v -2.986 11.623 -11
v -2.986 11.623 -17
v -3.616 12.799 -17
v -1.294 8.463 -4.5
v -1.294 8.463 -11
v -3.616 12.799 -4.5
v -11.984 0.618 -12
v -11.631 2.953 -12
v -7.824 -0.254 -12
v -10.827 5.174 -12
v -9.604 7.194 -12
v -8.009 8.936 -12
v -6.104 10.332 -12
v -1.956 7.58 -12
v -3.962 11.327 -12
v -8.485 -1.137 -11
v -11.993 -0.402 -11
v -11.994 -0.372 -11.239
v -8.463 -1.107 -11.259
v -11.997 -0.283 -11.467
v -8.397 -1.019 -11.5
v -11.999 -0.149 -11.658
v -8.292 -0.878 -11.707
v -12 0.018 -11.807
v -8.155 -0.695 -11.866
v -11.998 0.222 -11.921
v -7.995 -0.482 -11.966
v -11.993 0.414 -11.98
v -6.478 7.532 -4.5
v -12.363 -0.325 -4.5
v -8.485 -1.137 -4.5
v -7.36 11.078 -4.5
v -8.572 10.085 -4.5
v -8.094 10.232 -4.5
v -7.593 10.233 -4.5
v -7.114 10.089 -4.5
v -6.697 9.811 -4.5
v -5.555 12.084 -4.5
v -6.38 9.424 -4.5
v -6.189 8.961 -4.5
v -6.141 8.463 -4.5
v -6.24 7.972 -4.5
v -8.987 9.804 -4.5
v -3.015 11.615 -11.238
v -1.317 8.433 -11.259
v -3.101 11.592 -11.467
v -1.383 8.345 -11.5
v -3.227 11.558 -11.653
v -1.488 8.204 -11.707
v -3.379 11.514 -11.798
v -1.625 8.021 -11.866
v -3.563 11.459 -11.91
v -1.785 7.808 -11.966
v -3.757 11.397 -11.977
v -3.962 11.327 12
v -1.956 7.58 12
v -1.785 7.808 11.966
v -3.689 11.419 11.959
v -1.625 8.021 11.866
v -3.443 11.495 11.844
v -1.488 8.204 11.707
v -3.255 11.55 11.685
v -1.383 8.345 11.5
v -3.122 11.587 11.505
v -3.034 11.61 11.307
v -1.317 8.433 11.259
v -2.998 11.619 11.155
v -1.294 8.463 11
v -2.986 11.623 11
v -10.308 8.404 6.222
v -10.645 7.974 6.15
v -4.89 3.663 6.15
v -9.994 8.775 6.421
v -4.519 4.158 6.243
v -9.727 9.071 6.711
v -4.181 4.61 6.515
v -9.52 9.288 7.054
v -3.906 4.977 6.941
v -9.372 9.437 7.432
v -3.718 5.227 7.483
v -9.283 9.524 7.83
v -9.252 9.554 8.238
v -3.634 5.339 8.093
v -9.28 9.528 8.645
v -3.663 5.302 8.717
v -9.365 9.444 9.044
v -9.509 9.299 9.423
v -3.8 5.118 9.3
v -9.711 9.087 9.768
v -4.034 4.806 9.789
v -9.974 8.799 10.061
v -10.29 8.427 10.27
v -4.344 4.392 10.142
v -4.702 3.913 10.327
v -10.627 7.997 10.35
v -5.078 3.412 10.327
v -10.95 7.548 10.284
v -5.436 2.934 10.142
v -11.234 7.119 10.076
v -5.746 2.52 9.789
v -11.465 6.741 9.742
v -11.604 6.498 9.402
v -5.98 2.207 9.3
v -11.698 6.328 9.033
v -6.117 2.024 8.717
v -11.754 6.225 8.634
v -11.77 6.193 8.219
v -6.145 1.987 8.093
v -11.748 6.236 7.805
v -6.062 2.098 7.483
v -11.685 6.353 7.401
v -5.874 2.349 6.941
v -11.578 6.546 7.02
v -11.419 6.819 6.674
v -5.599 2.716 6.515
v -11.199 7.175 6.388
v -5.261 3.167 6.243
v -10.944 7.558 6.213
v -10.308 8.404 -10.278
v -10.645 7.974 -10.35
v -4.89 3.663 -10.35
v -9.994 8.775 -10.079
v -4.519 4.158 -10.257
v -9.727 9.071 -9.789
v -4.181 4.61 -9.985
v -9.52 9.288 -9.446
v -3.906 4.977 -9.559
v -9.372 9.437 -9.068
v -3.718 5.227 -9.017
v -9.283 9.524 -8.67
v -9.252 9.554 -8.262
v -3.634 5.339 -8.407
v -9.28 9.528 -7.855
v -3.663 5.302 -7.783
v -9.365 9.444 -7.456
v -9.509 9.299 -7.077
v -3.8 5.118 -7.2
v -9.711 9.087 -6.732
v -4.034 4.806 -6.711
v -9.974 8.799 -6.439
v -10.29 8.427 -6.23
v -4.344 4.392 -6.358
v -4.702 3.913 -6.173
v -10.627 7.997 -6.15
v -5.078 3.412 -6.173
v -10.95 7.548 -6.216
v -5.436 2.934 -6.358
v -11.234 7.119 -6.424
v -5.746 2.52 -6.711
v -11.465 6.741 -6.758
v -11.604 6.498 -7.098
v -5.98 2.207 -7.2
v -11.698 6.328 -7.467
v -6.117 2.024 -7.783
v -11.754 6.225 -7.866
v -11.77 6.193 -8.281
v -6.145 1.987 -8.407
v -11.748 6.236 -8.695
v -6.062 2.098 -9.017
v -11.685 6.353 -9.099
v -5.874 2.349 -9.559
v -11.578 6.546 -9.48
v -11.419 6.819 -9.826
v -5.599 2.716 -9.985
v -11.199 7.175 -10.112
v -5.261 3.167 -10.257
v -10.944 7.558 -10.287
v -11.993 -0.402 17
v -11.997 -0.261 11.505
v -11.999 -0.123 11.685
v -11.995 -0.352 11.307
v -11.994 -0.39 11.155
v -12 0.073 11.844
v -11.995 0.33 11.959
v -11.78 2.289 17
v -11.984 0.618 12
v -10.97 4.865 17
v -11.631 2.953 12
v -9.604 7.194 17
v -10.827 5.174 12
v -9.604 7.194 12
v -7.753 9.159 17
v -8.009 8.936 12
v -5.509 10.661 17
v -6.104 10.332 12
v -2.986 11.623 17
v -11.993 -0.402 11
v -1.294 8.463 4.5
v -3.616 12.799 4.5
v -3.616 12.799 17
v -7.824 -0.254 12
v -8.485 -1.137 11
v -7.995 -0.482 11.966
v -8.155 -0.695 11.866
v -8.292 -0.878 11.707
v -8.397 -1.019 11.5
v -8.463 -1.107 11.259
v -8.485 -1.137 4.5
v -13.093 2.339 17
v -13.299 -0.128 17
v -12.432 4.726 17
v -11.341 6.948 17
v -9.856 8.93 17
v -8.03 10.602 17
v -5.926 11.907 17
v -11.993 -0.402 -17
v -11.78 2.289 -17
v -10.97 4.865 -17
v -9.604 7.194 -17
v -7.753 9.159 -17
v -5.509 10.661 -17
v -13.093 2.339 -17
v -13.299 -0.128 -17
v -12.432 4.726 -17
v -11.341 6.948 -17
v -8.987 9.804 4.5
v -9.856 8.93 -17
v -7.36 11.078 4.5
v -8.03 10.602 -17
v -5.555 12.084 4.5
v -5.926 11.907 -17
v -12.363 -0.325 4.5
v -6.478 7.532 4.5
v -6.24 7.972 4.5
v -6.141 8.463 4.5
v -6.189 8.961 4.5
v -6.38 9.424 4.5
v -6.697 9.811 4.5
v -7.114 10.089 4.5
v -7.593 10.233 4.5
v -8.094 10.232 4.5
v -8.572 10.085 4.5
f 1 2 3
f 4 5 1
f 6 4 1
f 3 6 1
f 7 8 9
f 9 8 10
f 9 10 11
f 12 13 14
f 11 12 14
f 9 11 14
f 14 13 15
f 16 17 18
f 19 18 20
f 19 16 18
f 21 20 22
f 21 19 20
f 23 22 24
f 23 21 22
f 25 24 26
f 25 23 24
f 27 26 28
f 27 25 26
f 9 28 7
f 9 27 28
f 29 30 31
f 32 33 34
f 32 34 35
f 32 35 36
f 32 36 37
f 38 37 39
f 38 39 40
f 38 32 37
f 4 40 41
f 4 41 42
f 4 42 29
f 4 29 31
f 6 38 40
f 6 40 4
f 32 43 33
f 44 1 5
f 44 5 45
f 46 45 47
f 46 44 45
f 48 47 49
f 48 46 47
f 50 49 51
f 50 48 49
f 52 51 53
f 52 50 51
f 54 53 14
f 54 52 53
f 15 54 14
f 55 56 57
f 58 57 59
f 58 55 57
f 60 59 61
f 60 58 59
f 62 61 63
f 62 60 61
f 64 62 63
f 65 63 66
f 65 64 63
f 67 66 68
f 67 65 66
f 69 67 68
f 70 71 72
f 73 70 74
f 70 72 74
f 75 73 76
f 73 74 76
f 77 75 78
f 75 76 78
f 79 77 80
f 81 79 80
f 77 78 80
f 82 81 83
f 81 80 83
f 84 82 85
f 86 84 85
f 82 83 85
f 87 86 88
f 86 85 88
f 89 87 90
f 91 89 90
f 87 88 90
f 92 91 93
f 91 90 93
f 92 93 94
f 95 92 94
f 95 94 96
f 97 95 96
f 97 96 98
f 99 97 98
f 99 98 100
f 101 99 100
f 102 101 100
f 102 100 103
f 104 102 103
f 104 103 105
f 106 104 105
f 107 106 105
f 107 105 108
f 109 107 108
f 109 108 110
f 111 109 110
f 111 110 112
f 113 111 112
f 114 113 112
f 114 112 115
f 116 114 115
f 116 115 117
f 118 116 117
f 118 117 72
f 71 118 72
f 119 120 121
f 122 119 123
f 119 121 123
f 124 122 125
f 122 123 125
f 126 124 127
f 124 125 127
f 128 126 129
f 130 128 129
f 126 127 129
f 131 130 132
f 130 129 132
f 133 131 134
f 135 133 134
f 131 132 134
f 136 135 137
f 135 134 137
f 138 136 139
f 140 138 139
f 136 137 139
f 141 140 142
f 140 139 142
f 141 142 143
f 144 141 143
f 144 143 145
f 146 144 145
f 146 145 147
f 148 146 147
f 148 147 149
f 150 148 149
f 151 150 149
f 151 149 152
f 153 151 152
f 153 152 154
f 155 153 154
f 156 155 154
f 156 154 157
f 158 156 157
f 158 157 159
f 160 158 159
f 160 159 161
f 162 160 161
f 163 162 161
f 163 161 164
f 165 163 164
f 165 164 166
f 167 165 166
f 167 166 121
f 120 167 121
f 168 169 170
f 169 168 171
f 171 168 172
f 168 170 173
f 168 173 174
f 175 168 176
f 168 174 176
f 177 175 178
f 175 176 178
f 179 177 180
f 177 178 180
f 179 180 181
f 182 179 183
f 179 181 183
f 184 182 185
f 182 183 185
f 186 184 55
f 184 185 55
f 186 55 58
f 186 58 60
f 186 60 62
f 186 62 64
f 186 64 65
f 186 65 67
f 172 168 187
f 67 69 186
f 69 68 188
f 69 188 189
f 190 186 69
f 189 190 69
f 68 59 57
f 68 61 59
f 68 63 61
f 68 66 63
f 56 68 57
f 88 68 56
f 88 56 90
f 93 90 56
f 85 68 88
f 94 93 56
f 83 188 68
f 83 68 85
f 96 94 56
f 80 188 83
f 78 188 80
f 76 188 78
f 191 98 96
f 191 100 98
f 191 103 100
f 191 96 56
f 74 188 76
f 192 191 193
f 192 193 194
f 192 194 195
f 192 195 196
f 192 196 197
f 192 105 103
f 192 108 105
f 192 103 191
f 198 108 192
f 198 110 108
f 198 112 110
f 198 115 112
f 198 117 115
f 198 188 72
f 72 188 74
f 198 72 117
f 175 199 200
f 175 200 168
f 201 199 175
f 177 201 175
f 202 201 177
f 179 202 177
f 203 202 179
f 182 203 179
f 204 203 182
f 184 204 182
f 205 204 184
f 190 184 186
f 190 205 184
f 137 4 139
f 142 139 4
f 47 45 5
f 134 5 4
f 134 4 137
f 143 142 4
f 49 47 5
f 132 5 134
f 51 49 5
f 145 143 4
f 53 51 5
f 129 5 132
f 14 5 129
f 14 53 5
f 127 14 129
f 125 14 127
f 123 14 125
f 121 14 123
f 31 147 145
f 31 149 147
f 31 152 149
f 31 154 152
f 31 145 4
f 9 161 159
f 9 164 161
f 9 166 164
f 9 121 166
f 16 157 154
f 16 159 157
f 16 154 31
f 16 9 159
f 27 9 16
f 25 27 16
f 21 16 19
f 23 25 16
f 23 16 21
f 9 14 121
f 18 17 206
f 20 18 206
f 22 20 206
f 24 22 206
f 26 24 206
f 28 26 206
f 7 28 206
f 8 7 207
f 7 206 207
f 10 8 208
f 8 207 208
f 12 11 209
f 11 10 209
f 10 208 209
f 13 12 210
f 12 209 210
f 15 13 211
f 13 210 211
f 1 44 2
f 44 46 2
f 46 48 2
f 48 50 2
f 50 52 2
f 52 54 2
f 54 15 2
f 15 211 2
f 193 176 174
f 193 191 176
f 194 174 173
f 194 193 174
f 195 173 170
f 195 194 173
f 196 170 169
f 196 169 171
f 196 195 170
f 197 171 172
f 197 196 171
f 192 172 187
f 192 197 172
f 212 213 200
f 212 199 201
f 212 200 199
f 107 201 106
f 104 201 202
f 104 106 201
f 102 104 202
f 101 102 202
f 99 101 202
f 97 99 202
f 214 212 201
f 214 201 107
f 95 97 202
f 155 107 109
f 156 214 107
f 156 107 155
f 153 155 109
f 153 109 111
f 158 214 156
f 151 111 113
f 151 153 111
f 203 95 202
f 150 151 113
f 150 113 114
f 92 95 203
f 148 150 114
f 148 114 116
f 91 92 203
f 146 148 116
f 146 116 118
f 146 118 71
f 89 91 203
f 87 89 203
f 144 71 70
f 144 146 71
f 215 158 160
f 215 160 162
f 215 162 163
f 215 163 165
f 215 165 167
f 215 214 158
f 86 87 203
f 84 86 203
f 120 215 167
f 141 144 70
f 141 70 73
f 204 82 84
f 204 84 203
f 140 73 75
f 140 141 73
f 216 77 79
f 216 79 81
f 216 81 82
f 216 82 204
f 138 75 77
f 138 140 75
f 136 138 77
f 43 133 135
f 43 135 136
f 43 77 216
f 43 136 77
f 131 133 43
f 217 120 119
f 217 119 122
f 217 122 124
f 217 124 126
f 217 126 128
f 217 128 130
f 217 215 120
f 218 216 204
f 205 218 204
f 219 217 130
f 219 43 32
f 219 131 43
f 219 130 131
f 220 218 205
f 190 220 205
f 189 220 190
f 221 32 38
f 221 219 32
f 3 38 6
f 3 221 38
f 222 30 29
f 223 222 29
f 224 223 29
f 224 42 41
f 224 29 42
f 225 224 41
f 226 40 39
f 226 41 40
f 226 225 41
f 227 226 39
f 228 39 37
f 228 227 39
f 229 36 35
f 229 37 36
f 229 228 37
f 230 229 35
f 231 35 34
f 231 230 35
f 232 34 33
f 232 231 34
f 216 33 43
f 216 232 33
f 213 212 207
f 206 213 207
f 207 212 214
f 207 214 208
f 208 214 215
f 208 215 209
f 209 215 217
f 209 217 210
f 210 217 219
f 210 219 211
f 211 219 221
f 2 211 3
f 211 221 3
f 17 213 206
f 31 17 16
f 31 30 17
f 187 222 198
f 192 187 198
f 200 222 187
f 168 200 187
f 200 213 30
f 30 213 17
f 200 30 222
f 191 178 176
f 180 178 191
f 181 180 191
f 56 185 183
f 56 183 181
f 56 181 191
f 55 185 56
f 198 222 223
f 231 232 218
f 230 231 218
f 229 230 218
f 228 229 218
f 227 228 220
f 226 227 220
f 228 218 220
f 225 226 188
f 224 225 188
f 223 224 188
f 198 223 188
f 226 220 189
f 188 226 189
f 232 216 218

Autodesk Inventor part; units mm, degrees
ref_plane "YZ Plane" through (0, 0, 0) normal (1, 0, 0) x (0, 1, 0)
ref_plane "XZ Plane" through (0, 0, 0) normal (0, 1, 0) x (-1, 0, 0)
ref_plane "XY Plane" through (0, 0, 0) normal (0, 0, 1) x (1, 0, 0)
sketch "Эскиз1" plane through (0, 0, 0) normal (0, 0, 1) x (1, 0, 0)
  arc A0 (-0.8919, 11.7662) -> (-11.5424, -2.4521) centre (0, 0) ccw projected
  line L0 (-0.016, 10.1696) -> (-9.7639, -2.8438) projected
  line L1 (-9.7639, -2.8438) -> (-12.4663, -6.4515) projected
  arc A1 (-0.8919, 11.7662) -> (-11.5424, -2.4521) centre (0, 0) ccw projected
  line L2 (2.8533, 14) -> (-0.016, 10.1696) projected
  arc A2 (-8.5159, 10.4752) -> (-12.3517, -5.4484) centre (0, 0) ccw projected
  circle A3 centre (0, 0) radius 13.5
  circle A4 centre (0, 0) radius 11.8
  circle A5 centre (0, 0) radius 13.3
  circle A6 centre (0, 0) radius 12
  line L3 (-8.1467, 14) -> (2.8533, 14) projected
  line L4 (-8.1467, 14) -> (-8.1467, 11.2511) projected
  arc A7 (-11.5424, -2.4521) -> (-9.7639, -2.8438) centre (-10.5642, -2.2443) ccw projected
  arc A8 (-0.016, 10.1696) -> (-0.8919, 11.7662) centre (-0.8163, 10.7691) ccw projected
  arc A9 (-8.5159, 10.4752) -> (-8.1467, 11.2511) centre (-9.1467, 11.2511) ccw projected
  arc A10 (-12.4663, -6.4515) -> (-12.3517, -5.4484) centre (-13.2667, -5.852) ccw projected
  arc A11 (-11.5424, -2.4521) -> (-9.7639, -2.8438) centre (-10.5642, -2.2443) ccw projected
  arc A12 (-0.016, 10.1696) -> (-0.8919, 11.7662) centre (-0.8163, 10.7691) ccw projected
  point P0 (1.1623, 11.7426)
  point P1 (2.3273, 13.2979)
  point P2 (-11.0819, -4.6034)
  point P3 (1.302, 11.9292)
  point P4 (2.1926, 13.118)
  point P5 (-11.9725, -5.7923)
  dimension "d1" = 0.2
  dimension "d2" = 0.2
extrude "Выдавливание1" add sketch "Эскиз1" along normal mid plane 34 contours A6 L1 A5 L2 picked at (-9.9488, 8.0267)
sketch "Эскиз2" plane through (0, 0, 0) normal (0, 0, 1) x (1, 0, 0)
  arc A0 (-0.8919, 11.7662) -> (-11.5424, -2.4521) centre (0, 0) ccw projected
  line L0 (-0.016, 10.1696) -> (-9.7639, -2.8438) projected
  arc A1 (1.302, 11.9292) -> (-11.0819, -4.6034) centre (0, 0) ccw projected
  line L1 (-14.5944, -9.2926) -> (2.8533, 14) projected
  arc A2 (-11.5424, -2.4521) -> (-9.7639, -2.8438) centre (-10.5642, -2.2443) ccw projected
  arc A3 (-0.016, 10.1696) -> (-0.8919, 11.7662) centre (-0.8163, 10.7691) ccw projected
  point P0 (1.1623, 11.7426)
  point P1 (-10.9422, -4.4168)
extrude "Выдавливание2" add sketch "Эскиз2" along normal mid plane 24
sketch "Эскиз3" plane through (0, 0, 0) normal (0, 0, 1) x (1, 0, 0)
  arc A0 (1.302, 11.9292) -> (-11.0819, -4.6034) centre (0, 0) ccw projected
  line L0 (-11.0819, -4.6034) -> (1.302, 11.9292) projected
  arc A1 (2.1926, 13.118) -> (-11.9725, -5.7923) centre (0, 0) ccw projected
  arc A2 (-8.5159, 10.4752) -> (-12.3517, -5.4484) centre (0, 0) ccw projected
  line L1 (1.302, 11.9292) -> (-11.0819, -4.6034) projected
  line L2 (-4.8899, 3.6629) -> (-10.8048, 8.0935)
  line L3 (-10.8048, 8.0935) -> (-7.6034, 5.6955)
  line L4 (-12.0998, -0.3072) -> (-3.107, 11.6981)
  line L5 (-3.107, 11.6981) -> (0.0944, 9.3001)
  line L6 (0.0944, 9.3001) -> (-8.8984, -2.7053)
  line L7 (-8.8984, -2.7053) -> (-12.0998, -0.3072)
  line L8 (-12.3798, -0.3474) -> (-3.1472, 11.9781)
  line L9 (-3.1472, 11.9781) -> (0.3744, 9.3402)
  line L10 (0.3744, 9.3402) -> (-8.8582, -2.9853)
  line L11 (-8.8582, -2.9853) -> (-12.3798, -0.3474)
  point P0 (-4.402, 3.2974)
  dimension "d7" = 4
  dimension "d8" = 15
  dimension "d9" = 4
  dimension "d12" = 0.2
  dimension "d13" = 15.4
extrude "Выдавливание3" cut sketch "Эскиз3" along normal mid plane 9 contours L9 L0 L5 A0 | A0 L5 L4 L8 L9 | L9 L10 L11 L0 L7 L6 L5 | L5 L0 L2 L4 A0 | A0 L4 L5 | L5 L6 L7 L0 | L4 L2 L8 A0 | L0 L7 A0 L4 L2 | L4 A0 L8 L2 | L0 L11 A0 L7 | L4 L7 A0 L11 L8 | A0 L7 L4
sketch "Эскиз5" plane through (0, 0, 17) normal (0, 0, 1) x (1, 0, 0)
  arc A0 (2.1926, 13.118) -> (-11.9725, -5.7923) centre (0, 0) ccw projected
  circle A1 centre (0, 0) radius 13.3
  line L0 (2.8533, 17.048) -> (2.8533, 14) projected
  circle A2 centre (0, 0) radius 2.8533
  line L1 (9.8804, -12.4095) -> (-5.8229, 16.921)
  line L2 (0, 0) -> (2.5154, 1.3467)
  line L3 (-19.8346, 1.2413) -> (17.8745, -6.661)
  line L4 (0, 0) -> (-0.5852, -2.7926)
  line L5 (0, 0) -> (-4.8899, 3.6629)
  line L6 (-0.2736, 9.8256) -> (-9.5063, -2.4999) projected
  point P0 (5.4035, -4.0476)
  point P1 (-13.2994, -0.1282)
  point P2 (-11.9725, -5.7923)
  point P3 (8.6469, -10.1055)
  point P4 (12.1289, -5.457)
  point P5 (-3.6161, 12.799)
  dimension "d19" = 115
  dimension "d20" = 115
extrude "Выдавливание5" cut sketch "Эскиз5" against normal blind 40 contours A1 L3 L1 A0 | L3 L1 A1 A0
sketch "Эскиз6" plane through (-8.4854, -1.137, 12) normal (0.8003585, -0.5995217, 0) x (0, 0, -1)
  line L0 (16.5, 0) -> (24, 0) projected
  line L1 (24, 11.9944) -> (24, 0) projected
  line L2 (7.5, 11.9944) -> (0, 11.9944) projected
  line L3 (0, 0) -> (0, 11.9944) projected
  line L4 (16.5, 11.9944) -> (16.5, 0) projected
  line L5 (7.5, 0) -> (7.5, 11.9944) projected
  line L6 (0, 0) -> (0, 11.9944) projected
  line L7 (0, 5.9972) -> (7.5, 5.9972)
  line L8 (7.5, 0) -> (7.5, 11.9944) projected
  line L9 (16.5, 5.9972) -> (24, 5.9972)
  circle A0 centre (3.75, 5.9972) radius 2.1
  circle A1 centre (20.25, 5.9972) radius 2.1
  line L10 (24, 11.9944) -> (16.5, 11.9944) projected
  line L11 (0, 0) -> (7.5, 0) projected
  point P0 (12, 5.9972)
  dimension "d23" = 4.2
  dimension "d24" = 4.2
extrude "Выдавливание6" cut sketch "Эскиз6" against normal blind 40 contours A1 L9 | L9 A1 | A0 L7 | L7 A0
fillet "Сопряжение2" radius 1 4 edges at (-2.1403, 10.0427, 12) (-10.2393, -0.7695, 12) (-2.1403, 10.0427, -12) (-10.2393, -0.7695, -12)
fillet "Сопряжение3" radius 5 1 edges at (-3.1643, 11.9552, 0)
fillet "Сопряжение4" radius 1.7 1 edges at (-3.6161, 12.799, 0)
properties part number "camera fixator"
